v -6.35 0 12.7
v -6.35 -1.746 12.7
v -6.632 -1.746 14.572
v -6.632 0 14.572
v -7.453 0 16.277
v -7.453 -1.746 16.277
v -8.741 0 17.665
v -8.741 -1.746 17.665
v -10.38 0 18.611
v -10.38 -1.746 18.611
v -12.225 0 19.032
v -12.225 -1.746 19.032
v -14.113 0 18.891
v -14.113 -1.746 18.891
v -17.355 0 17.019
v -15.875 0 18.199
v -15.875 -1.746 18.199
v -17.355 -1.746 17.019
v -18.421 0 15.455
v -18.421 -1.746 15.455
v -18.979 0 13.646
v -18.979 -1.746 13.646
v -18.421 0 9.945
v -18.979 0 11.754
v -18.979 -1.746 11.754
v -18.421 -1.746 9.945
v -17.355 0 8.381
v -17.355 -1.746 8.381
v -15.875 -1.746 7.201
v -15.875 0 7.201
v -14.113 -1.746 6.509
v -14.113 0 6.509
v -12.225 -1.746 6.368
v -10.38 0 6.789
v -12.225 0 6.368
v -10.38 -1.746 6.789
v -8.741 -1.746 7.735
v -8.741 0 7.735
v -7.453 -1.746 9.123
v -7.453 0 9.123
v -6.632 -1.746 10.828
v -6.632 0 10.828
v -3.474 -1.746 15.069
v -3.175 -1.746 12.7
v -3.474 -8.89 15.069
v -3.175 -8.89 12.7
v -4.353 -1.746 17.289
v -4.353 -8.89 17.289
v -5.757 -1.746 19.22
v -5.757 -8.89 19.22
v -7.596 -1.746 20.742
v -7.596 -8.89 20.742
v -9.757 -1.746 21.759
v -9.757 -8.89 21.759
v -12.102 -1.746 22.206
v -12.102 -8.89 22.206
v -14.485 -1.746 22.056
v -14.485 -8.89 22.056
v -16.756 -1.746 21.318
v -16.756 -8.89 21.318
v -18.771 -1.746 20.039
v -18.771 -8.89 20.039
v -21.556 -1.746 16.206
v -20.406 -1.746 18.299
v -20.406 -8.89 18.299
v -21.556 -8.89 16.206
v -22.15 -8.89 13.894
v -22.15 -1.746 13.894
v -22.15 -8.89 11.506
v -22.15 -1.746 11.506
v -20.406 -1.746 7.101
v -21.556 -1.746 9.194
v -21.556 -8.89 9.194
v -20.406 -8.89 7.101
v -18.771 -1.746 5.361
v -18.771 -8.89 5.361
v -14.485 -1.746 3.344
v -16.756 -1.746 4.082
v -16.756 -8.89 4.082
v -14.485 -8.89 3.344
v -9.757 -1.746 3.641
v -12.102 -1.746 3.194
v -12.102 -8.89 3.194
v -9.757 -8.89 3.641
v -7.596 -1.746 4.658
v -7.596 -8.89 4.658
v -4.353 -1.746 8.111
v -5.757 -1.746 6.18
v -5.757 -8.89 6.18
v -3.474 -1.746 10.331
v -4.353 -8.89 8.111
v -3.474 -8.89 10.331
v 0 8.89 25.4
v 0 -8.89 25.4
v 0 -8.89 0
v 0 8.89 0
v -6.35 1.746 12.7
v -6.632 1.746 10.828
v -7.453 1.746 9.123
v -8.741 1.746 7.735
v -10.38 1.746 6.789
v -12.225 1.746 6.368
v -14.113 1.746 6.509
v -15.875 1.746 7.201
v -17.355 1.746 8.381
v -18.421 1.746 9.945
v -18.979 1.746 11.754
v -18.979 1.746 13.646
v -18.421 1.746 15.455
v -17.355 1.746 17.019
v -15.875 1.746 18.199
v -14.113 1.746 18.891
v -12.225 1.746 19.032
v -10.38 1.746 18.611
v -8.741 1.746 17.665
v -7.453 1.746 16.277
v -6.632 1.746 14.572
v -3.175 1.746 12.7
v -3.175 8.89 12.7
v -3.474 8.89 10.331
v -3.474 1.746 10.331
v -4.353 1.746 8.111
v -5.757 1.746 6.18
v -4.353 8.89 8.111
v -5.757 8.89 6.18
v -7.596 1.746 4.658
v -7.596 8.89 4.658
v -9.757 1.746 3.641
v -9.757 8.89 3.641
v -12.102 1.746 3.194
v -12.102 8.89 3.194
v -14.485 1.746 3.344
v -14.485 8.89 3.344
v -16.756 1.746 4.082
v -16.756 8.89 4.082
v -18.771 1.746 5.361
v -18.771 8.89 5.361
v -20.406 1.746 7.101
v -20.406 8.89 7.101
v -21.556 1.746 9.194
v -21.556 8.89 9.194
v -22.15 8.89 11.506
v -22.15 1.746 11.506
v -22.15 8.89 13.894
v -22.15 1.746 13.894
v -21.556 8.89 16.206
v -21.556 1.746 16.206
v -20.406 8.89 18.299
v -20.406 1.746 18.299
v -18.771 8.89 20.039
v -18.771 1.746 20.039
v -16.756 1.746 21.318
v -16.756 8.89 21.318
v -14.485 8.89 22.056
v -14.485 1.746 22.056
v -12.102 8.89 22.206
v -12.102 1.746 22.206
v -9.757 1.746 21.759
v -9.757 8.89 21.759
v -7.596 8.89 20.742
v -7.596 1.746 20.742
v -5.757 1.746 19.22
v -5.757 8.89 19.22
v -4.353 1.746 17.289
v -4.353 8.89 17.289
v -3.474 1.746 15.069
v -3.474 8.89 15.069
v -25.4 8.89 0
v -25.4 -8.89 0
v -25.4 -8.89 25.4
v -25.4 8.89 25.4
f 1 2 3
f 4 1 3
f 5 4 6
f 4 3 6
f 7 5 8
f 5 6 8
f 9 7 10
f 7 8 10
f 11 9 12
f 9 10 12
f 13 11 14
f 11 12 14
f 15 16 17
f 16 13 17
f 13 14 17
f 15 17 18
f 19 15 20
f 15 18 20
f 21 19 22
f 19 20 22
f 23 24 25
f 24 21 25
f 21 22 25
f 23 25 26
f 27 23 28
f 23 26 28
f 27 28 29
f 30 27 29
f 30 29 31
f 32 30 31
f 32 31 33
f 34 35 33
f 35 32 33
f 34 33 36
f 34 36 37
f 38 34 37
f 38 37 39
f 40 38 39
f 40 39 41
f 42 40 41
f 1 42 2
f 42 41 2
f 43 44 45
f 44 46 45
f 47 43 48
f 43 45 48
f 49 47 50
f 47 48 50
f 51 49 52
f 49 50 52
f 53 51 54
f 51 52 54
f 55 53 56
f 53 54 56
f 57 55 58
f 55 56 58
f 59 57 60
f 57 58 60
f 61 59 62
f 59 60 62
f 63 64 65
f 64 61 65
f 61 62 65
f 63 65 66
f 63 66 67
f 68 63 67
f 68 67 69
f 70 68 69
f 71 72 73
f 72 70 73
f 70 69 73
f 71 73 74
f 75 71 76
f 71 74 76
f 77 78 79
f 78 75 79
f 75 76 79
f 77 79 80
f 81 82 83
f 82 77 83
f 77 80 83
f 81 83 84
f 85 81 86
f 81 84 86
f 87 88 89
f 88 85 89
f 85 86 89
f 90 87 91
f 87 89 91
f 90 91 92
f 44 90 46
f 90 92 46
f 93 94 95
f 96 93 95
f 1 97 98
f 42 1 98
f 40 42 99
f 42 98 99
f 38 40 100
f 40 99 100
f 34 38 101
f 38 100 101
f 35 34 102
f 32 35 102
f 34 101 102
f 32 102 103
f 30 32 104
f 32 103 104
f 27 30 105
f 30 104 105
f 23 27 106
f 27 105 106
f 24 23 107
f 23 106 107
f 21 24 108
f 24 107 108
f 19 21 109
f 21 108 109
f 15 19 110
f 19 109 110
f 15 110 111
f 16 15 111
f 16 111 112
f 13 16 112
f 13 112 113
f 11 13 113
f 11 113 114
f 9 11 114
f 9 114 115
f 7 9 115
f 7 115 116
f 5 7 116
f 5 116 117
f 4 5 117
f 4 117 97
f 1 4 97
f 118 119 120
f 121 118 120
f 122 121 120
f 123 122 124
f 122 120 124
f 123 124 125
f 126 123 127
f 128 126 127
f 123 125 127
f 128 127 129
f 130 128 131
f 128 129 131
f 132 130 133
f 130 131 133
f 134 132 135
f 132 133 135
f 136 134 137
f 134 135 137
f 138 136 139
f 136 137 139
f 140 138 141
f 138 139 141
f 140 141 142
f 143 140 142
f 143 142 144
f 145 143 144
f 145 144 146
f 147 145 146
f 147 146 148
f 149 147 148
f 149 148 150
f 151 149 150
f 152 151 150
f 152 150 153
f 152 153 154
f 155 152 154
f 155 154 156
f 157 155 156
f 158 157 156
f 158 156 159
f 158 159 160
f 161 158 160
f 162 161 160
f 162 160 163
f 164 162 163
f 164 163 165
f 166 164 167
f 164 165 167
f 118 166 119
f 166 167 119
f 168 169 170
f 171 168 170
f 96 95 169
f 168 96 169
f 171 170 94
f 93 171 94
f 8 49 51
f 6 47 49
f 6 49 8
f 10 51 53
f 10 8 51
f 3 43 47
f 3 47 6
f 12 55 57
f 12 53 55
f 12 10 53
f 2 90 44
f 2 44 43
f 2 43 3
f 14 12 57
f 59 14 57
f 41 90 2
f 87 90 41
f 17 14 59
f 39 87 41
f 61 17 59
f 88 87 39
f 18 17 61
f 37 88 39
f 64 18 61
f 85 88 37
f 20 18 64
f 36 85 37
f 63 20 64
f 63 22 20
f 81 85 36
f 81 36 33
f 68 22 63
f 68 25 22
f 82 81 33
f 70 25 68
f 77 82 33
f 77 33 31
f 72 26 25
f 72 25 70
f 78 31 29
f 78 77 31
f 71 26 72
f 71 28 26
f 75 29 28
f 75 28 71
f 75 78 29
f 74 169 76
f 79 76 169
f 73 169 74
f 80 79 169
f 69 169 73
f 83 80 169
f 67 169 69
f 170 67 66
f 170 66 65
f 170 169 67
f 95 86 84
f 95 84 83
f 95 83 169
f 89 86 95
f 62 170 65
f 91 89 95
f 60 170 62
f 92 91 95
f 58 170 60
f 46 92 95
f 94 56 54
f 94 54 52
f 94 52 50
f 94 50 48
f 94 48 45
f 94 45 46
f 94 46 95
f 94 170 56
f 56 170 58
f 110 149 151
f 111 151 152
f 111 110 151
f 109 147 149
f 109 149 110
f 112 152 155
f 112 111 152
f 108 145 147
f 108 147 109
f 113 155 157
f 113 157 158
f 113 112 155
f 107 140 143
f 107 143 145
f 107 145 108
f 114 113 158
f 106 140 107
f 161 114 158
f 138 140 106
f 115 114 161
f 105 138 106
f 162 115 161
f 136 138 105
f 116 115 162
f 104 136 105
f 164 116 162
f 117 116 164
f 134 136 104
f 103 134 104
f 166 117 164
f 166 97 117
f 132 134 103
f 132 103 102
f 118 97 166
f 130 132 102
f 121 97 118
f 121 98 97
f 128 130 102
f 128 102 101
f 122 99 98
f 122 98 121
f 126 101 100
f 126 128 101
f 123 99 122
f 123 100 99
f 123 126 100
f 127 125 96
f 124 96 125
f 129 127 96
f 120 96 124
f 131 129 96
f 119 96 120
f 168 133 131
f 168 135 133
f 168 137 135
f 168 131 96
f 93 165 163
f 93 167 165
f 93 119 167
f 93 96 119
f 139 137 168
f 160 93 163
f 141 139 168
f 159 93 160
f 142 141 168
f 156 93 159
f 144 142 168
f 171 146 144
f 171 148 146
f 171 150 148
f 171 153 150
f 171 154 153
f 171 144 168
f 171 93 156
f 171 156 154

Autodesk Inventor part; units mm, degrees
ref_plane "YZ Plane" through (0, 0, 0) normal (1, 0, 0) x (0, 1, 0)
ref_plane "XZ Plane" through (0, 0, 0) normal (0, 1, 0) x (-1, 0, 0)
ref_plane "XY Plane" through (0, 0, 0) normal (0, 0, 1) x (1, 0, 0)
sketch "Sketch1" plane through (0, 0, 0) normal (0, 1, 0) x (-1, 0, 0)
  line L0 (0, 0) -> (25.4, 0)
  line L1 (25.4, 0) -> (25.4, 25.4)
  line L2 (25.4, 25.4) -> (0, 25.4)
  line L3 (0, 25.4) -> (0, 0)
  dimension "d0" = 25.4
  dimension "d1" = 25.4
extrude "Extrusion1" add sketch "Sketch1" along normal blind 8.89
sketch "Sketch2" plane through (0, 8.89, 0) normal (0, 1, 0) x (1, 0, 0)
  circle A0 centre (-12.7, -12.7) radius 9.525
  point P0 (-25.4, 0)
  dimension "d4" = 19.05
  dimension "d5" = 12.7
  dimension "d6" = 12.7
extrude "Extrusion2" cut sketch "Sketch2" against normal blind 7.1437
sketch "Sketch3" plane through (-12.7, 1.7463, 12.7) normal (0, 1, 0) x (1, 0, 0)
  circle A0 centre (0, 0) radius 9.525 projected
  circle A1 centre (0, 0) radius 3.175
  circle A2 centre (0, 0) radius 6.35
  point P0 (12.7, 12.7)
  dimension "d9" = 6.35
  dimension "d12" = 3.175
  dimension "d13" = 3.175
extrude "Extrusion3" cut sketch "Sketch3" against normal through all contours A1 | A2
mirror "Mirror1" about plane through (-12.7, 0, 12.7) normal (0, -1, 0)
equation "\"d12\" = d13"
properties part number "acmeBearingBlock"
